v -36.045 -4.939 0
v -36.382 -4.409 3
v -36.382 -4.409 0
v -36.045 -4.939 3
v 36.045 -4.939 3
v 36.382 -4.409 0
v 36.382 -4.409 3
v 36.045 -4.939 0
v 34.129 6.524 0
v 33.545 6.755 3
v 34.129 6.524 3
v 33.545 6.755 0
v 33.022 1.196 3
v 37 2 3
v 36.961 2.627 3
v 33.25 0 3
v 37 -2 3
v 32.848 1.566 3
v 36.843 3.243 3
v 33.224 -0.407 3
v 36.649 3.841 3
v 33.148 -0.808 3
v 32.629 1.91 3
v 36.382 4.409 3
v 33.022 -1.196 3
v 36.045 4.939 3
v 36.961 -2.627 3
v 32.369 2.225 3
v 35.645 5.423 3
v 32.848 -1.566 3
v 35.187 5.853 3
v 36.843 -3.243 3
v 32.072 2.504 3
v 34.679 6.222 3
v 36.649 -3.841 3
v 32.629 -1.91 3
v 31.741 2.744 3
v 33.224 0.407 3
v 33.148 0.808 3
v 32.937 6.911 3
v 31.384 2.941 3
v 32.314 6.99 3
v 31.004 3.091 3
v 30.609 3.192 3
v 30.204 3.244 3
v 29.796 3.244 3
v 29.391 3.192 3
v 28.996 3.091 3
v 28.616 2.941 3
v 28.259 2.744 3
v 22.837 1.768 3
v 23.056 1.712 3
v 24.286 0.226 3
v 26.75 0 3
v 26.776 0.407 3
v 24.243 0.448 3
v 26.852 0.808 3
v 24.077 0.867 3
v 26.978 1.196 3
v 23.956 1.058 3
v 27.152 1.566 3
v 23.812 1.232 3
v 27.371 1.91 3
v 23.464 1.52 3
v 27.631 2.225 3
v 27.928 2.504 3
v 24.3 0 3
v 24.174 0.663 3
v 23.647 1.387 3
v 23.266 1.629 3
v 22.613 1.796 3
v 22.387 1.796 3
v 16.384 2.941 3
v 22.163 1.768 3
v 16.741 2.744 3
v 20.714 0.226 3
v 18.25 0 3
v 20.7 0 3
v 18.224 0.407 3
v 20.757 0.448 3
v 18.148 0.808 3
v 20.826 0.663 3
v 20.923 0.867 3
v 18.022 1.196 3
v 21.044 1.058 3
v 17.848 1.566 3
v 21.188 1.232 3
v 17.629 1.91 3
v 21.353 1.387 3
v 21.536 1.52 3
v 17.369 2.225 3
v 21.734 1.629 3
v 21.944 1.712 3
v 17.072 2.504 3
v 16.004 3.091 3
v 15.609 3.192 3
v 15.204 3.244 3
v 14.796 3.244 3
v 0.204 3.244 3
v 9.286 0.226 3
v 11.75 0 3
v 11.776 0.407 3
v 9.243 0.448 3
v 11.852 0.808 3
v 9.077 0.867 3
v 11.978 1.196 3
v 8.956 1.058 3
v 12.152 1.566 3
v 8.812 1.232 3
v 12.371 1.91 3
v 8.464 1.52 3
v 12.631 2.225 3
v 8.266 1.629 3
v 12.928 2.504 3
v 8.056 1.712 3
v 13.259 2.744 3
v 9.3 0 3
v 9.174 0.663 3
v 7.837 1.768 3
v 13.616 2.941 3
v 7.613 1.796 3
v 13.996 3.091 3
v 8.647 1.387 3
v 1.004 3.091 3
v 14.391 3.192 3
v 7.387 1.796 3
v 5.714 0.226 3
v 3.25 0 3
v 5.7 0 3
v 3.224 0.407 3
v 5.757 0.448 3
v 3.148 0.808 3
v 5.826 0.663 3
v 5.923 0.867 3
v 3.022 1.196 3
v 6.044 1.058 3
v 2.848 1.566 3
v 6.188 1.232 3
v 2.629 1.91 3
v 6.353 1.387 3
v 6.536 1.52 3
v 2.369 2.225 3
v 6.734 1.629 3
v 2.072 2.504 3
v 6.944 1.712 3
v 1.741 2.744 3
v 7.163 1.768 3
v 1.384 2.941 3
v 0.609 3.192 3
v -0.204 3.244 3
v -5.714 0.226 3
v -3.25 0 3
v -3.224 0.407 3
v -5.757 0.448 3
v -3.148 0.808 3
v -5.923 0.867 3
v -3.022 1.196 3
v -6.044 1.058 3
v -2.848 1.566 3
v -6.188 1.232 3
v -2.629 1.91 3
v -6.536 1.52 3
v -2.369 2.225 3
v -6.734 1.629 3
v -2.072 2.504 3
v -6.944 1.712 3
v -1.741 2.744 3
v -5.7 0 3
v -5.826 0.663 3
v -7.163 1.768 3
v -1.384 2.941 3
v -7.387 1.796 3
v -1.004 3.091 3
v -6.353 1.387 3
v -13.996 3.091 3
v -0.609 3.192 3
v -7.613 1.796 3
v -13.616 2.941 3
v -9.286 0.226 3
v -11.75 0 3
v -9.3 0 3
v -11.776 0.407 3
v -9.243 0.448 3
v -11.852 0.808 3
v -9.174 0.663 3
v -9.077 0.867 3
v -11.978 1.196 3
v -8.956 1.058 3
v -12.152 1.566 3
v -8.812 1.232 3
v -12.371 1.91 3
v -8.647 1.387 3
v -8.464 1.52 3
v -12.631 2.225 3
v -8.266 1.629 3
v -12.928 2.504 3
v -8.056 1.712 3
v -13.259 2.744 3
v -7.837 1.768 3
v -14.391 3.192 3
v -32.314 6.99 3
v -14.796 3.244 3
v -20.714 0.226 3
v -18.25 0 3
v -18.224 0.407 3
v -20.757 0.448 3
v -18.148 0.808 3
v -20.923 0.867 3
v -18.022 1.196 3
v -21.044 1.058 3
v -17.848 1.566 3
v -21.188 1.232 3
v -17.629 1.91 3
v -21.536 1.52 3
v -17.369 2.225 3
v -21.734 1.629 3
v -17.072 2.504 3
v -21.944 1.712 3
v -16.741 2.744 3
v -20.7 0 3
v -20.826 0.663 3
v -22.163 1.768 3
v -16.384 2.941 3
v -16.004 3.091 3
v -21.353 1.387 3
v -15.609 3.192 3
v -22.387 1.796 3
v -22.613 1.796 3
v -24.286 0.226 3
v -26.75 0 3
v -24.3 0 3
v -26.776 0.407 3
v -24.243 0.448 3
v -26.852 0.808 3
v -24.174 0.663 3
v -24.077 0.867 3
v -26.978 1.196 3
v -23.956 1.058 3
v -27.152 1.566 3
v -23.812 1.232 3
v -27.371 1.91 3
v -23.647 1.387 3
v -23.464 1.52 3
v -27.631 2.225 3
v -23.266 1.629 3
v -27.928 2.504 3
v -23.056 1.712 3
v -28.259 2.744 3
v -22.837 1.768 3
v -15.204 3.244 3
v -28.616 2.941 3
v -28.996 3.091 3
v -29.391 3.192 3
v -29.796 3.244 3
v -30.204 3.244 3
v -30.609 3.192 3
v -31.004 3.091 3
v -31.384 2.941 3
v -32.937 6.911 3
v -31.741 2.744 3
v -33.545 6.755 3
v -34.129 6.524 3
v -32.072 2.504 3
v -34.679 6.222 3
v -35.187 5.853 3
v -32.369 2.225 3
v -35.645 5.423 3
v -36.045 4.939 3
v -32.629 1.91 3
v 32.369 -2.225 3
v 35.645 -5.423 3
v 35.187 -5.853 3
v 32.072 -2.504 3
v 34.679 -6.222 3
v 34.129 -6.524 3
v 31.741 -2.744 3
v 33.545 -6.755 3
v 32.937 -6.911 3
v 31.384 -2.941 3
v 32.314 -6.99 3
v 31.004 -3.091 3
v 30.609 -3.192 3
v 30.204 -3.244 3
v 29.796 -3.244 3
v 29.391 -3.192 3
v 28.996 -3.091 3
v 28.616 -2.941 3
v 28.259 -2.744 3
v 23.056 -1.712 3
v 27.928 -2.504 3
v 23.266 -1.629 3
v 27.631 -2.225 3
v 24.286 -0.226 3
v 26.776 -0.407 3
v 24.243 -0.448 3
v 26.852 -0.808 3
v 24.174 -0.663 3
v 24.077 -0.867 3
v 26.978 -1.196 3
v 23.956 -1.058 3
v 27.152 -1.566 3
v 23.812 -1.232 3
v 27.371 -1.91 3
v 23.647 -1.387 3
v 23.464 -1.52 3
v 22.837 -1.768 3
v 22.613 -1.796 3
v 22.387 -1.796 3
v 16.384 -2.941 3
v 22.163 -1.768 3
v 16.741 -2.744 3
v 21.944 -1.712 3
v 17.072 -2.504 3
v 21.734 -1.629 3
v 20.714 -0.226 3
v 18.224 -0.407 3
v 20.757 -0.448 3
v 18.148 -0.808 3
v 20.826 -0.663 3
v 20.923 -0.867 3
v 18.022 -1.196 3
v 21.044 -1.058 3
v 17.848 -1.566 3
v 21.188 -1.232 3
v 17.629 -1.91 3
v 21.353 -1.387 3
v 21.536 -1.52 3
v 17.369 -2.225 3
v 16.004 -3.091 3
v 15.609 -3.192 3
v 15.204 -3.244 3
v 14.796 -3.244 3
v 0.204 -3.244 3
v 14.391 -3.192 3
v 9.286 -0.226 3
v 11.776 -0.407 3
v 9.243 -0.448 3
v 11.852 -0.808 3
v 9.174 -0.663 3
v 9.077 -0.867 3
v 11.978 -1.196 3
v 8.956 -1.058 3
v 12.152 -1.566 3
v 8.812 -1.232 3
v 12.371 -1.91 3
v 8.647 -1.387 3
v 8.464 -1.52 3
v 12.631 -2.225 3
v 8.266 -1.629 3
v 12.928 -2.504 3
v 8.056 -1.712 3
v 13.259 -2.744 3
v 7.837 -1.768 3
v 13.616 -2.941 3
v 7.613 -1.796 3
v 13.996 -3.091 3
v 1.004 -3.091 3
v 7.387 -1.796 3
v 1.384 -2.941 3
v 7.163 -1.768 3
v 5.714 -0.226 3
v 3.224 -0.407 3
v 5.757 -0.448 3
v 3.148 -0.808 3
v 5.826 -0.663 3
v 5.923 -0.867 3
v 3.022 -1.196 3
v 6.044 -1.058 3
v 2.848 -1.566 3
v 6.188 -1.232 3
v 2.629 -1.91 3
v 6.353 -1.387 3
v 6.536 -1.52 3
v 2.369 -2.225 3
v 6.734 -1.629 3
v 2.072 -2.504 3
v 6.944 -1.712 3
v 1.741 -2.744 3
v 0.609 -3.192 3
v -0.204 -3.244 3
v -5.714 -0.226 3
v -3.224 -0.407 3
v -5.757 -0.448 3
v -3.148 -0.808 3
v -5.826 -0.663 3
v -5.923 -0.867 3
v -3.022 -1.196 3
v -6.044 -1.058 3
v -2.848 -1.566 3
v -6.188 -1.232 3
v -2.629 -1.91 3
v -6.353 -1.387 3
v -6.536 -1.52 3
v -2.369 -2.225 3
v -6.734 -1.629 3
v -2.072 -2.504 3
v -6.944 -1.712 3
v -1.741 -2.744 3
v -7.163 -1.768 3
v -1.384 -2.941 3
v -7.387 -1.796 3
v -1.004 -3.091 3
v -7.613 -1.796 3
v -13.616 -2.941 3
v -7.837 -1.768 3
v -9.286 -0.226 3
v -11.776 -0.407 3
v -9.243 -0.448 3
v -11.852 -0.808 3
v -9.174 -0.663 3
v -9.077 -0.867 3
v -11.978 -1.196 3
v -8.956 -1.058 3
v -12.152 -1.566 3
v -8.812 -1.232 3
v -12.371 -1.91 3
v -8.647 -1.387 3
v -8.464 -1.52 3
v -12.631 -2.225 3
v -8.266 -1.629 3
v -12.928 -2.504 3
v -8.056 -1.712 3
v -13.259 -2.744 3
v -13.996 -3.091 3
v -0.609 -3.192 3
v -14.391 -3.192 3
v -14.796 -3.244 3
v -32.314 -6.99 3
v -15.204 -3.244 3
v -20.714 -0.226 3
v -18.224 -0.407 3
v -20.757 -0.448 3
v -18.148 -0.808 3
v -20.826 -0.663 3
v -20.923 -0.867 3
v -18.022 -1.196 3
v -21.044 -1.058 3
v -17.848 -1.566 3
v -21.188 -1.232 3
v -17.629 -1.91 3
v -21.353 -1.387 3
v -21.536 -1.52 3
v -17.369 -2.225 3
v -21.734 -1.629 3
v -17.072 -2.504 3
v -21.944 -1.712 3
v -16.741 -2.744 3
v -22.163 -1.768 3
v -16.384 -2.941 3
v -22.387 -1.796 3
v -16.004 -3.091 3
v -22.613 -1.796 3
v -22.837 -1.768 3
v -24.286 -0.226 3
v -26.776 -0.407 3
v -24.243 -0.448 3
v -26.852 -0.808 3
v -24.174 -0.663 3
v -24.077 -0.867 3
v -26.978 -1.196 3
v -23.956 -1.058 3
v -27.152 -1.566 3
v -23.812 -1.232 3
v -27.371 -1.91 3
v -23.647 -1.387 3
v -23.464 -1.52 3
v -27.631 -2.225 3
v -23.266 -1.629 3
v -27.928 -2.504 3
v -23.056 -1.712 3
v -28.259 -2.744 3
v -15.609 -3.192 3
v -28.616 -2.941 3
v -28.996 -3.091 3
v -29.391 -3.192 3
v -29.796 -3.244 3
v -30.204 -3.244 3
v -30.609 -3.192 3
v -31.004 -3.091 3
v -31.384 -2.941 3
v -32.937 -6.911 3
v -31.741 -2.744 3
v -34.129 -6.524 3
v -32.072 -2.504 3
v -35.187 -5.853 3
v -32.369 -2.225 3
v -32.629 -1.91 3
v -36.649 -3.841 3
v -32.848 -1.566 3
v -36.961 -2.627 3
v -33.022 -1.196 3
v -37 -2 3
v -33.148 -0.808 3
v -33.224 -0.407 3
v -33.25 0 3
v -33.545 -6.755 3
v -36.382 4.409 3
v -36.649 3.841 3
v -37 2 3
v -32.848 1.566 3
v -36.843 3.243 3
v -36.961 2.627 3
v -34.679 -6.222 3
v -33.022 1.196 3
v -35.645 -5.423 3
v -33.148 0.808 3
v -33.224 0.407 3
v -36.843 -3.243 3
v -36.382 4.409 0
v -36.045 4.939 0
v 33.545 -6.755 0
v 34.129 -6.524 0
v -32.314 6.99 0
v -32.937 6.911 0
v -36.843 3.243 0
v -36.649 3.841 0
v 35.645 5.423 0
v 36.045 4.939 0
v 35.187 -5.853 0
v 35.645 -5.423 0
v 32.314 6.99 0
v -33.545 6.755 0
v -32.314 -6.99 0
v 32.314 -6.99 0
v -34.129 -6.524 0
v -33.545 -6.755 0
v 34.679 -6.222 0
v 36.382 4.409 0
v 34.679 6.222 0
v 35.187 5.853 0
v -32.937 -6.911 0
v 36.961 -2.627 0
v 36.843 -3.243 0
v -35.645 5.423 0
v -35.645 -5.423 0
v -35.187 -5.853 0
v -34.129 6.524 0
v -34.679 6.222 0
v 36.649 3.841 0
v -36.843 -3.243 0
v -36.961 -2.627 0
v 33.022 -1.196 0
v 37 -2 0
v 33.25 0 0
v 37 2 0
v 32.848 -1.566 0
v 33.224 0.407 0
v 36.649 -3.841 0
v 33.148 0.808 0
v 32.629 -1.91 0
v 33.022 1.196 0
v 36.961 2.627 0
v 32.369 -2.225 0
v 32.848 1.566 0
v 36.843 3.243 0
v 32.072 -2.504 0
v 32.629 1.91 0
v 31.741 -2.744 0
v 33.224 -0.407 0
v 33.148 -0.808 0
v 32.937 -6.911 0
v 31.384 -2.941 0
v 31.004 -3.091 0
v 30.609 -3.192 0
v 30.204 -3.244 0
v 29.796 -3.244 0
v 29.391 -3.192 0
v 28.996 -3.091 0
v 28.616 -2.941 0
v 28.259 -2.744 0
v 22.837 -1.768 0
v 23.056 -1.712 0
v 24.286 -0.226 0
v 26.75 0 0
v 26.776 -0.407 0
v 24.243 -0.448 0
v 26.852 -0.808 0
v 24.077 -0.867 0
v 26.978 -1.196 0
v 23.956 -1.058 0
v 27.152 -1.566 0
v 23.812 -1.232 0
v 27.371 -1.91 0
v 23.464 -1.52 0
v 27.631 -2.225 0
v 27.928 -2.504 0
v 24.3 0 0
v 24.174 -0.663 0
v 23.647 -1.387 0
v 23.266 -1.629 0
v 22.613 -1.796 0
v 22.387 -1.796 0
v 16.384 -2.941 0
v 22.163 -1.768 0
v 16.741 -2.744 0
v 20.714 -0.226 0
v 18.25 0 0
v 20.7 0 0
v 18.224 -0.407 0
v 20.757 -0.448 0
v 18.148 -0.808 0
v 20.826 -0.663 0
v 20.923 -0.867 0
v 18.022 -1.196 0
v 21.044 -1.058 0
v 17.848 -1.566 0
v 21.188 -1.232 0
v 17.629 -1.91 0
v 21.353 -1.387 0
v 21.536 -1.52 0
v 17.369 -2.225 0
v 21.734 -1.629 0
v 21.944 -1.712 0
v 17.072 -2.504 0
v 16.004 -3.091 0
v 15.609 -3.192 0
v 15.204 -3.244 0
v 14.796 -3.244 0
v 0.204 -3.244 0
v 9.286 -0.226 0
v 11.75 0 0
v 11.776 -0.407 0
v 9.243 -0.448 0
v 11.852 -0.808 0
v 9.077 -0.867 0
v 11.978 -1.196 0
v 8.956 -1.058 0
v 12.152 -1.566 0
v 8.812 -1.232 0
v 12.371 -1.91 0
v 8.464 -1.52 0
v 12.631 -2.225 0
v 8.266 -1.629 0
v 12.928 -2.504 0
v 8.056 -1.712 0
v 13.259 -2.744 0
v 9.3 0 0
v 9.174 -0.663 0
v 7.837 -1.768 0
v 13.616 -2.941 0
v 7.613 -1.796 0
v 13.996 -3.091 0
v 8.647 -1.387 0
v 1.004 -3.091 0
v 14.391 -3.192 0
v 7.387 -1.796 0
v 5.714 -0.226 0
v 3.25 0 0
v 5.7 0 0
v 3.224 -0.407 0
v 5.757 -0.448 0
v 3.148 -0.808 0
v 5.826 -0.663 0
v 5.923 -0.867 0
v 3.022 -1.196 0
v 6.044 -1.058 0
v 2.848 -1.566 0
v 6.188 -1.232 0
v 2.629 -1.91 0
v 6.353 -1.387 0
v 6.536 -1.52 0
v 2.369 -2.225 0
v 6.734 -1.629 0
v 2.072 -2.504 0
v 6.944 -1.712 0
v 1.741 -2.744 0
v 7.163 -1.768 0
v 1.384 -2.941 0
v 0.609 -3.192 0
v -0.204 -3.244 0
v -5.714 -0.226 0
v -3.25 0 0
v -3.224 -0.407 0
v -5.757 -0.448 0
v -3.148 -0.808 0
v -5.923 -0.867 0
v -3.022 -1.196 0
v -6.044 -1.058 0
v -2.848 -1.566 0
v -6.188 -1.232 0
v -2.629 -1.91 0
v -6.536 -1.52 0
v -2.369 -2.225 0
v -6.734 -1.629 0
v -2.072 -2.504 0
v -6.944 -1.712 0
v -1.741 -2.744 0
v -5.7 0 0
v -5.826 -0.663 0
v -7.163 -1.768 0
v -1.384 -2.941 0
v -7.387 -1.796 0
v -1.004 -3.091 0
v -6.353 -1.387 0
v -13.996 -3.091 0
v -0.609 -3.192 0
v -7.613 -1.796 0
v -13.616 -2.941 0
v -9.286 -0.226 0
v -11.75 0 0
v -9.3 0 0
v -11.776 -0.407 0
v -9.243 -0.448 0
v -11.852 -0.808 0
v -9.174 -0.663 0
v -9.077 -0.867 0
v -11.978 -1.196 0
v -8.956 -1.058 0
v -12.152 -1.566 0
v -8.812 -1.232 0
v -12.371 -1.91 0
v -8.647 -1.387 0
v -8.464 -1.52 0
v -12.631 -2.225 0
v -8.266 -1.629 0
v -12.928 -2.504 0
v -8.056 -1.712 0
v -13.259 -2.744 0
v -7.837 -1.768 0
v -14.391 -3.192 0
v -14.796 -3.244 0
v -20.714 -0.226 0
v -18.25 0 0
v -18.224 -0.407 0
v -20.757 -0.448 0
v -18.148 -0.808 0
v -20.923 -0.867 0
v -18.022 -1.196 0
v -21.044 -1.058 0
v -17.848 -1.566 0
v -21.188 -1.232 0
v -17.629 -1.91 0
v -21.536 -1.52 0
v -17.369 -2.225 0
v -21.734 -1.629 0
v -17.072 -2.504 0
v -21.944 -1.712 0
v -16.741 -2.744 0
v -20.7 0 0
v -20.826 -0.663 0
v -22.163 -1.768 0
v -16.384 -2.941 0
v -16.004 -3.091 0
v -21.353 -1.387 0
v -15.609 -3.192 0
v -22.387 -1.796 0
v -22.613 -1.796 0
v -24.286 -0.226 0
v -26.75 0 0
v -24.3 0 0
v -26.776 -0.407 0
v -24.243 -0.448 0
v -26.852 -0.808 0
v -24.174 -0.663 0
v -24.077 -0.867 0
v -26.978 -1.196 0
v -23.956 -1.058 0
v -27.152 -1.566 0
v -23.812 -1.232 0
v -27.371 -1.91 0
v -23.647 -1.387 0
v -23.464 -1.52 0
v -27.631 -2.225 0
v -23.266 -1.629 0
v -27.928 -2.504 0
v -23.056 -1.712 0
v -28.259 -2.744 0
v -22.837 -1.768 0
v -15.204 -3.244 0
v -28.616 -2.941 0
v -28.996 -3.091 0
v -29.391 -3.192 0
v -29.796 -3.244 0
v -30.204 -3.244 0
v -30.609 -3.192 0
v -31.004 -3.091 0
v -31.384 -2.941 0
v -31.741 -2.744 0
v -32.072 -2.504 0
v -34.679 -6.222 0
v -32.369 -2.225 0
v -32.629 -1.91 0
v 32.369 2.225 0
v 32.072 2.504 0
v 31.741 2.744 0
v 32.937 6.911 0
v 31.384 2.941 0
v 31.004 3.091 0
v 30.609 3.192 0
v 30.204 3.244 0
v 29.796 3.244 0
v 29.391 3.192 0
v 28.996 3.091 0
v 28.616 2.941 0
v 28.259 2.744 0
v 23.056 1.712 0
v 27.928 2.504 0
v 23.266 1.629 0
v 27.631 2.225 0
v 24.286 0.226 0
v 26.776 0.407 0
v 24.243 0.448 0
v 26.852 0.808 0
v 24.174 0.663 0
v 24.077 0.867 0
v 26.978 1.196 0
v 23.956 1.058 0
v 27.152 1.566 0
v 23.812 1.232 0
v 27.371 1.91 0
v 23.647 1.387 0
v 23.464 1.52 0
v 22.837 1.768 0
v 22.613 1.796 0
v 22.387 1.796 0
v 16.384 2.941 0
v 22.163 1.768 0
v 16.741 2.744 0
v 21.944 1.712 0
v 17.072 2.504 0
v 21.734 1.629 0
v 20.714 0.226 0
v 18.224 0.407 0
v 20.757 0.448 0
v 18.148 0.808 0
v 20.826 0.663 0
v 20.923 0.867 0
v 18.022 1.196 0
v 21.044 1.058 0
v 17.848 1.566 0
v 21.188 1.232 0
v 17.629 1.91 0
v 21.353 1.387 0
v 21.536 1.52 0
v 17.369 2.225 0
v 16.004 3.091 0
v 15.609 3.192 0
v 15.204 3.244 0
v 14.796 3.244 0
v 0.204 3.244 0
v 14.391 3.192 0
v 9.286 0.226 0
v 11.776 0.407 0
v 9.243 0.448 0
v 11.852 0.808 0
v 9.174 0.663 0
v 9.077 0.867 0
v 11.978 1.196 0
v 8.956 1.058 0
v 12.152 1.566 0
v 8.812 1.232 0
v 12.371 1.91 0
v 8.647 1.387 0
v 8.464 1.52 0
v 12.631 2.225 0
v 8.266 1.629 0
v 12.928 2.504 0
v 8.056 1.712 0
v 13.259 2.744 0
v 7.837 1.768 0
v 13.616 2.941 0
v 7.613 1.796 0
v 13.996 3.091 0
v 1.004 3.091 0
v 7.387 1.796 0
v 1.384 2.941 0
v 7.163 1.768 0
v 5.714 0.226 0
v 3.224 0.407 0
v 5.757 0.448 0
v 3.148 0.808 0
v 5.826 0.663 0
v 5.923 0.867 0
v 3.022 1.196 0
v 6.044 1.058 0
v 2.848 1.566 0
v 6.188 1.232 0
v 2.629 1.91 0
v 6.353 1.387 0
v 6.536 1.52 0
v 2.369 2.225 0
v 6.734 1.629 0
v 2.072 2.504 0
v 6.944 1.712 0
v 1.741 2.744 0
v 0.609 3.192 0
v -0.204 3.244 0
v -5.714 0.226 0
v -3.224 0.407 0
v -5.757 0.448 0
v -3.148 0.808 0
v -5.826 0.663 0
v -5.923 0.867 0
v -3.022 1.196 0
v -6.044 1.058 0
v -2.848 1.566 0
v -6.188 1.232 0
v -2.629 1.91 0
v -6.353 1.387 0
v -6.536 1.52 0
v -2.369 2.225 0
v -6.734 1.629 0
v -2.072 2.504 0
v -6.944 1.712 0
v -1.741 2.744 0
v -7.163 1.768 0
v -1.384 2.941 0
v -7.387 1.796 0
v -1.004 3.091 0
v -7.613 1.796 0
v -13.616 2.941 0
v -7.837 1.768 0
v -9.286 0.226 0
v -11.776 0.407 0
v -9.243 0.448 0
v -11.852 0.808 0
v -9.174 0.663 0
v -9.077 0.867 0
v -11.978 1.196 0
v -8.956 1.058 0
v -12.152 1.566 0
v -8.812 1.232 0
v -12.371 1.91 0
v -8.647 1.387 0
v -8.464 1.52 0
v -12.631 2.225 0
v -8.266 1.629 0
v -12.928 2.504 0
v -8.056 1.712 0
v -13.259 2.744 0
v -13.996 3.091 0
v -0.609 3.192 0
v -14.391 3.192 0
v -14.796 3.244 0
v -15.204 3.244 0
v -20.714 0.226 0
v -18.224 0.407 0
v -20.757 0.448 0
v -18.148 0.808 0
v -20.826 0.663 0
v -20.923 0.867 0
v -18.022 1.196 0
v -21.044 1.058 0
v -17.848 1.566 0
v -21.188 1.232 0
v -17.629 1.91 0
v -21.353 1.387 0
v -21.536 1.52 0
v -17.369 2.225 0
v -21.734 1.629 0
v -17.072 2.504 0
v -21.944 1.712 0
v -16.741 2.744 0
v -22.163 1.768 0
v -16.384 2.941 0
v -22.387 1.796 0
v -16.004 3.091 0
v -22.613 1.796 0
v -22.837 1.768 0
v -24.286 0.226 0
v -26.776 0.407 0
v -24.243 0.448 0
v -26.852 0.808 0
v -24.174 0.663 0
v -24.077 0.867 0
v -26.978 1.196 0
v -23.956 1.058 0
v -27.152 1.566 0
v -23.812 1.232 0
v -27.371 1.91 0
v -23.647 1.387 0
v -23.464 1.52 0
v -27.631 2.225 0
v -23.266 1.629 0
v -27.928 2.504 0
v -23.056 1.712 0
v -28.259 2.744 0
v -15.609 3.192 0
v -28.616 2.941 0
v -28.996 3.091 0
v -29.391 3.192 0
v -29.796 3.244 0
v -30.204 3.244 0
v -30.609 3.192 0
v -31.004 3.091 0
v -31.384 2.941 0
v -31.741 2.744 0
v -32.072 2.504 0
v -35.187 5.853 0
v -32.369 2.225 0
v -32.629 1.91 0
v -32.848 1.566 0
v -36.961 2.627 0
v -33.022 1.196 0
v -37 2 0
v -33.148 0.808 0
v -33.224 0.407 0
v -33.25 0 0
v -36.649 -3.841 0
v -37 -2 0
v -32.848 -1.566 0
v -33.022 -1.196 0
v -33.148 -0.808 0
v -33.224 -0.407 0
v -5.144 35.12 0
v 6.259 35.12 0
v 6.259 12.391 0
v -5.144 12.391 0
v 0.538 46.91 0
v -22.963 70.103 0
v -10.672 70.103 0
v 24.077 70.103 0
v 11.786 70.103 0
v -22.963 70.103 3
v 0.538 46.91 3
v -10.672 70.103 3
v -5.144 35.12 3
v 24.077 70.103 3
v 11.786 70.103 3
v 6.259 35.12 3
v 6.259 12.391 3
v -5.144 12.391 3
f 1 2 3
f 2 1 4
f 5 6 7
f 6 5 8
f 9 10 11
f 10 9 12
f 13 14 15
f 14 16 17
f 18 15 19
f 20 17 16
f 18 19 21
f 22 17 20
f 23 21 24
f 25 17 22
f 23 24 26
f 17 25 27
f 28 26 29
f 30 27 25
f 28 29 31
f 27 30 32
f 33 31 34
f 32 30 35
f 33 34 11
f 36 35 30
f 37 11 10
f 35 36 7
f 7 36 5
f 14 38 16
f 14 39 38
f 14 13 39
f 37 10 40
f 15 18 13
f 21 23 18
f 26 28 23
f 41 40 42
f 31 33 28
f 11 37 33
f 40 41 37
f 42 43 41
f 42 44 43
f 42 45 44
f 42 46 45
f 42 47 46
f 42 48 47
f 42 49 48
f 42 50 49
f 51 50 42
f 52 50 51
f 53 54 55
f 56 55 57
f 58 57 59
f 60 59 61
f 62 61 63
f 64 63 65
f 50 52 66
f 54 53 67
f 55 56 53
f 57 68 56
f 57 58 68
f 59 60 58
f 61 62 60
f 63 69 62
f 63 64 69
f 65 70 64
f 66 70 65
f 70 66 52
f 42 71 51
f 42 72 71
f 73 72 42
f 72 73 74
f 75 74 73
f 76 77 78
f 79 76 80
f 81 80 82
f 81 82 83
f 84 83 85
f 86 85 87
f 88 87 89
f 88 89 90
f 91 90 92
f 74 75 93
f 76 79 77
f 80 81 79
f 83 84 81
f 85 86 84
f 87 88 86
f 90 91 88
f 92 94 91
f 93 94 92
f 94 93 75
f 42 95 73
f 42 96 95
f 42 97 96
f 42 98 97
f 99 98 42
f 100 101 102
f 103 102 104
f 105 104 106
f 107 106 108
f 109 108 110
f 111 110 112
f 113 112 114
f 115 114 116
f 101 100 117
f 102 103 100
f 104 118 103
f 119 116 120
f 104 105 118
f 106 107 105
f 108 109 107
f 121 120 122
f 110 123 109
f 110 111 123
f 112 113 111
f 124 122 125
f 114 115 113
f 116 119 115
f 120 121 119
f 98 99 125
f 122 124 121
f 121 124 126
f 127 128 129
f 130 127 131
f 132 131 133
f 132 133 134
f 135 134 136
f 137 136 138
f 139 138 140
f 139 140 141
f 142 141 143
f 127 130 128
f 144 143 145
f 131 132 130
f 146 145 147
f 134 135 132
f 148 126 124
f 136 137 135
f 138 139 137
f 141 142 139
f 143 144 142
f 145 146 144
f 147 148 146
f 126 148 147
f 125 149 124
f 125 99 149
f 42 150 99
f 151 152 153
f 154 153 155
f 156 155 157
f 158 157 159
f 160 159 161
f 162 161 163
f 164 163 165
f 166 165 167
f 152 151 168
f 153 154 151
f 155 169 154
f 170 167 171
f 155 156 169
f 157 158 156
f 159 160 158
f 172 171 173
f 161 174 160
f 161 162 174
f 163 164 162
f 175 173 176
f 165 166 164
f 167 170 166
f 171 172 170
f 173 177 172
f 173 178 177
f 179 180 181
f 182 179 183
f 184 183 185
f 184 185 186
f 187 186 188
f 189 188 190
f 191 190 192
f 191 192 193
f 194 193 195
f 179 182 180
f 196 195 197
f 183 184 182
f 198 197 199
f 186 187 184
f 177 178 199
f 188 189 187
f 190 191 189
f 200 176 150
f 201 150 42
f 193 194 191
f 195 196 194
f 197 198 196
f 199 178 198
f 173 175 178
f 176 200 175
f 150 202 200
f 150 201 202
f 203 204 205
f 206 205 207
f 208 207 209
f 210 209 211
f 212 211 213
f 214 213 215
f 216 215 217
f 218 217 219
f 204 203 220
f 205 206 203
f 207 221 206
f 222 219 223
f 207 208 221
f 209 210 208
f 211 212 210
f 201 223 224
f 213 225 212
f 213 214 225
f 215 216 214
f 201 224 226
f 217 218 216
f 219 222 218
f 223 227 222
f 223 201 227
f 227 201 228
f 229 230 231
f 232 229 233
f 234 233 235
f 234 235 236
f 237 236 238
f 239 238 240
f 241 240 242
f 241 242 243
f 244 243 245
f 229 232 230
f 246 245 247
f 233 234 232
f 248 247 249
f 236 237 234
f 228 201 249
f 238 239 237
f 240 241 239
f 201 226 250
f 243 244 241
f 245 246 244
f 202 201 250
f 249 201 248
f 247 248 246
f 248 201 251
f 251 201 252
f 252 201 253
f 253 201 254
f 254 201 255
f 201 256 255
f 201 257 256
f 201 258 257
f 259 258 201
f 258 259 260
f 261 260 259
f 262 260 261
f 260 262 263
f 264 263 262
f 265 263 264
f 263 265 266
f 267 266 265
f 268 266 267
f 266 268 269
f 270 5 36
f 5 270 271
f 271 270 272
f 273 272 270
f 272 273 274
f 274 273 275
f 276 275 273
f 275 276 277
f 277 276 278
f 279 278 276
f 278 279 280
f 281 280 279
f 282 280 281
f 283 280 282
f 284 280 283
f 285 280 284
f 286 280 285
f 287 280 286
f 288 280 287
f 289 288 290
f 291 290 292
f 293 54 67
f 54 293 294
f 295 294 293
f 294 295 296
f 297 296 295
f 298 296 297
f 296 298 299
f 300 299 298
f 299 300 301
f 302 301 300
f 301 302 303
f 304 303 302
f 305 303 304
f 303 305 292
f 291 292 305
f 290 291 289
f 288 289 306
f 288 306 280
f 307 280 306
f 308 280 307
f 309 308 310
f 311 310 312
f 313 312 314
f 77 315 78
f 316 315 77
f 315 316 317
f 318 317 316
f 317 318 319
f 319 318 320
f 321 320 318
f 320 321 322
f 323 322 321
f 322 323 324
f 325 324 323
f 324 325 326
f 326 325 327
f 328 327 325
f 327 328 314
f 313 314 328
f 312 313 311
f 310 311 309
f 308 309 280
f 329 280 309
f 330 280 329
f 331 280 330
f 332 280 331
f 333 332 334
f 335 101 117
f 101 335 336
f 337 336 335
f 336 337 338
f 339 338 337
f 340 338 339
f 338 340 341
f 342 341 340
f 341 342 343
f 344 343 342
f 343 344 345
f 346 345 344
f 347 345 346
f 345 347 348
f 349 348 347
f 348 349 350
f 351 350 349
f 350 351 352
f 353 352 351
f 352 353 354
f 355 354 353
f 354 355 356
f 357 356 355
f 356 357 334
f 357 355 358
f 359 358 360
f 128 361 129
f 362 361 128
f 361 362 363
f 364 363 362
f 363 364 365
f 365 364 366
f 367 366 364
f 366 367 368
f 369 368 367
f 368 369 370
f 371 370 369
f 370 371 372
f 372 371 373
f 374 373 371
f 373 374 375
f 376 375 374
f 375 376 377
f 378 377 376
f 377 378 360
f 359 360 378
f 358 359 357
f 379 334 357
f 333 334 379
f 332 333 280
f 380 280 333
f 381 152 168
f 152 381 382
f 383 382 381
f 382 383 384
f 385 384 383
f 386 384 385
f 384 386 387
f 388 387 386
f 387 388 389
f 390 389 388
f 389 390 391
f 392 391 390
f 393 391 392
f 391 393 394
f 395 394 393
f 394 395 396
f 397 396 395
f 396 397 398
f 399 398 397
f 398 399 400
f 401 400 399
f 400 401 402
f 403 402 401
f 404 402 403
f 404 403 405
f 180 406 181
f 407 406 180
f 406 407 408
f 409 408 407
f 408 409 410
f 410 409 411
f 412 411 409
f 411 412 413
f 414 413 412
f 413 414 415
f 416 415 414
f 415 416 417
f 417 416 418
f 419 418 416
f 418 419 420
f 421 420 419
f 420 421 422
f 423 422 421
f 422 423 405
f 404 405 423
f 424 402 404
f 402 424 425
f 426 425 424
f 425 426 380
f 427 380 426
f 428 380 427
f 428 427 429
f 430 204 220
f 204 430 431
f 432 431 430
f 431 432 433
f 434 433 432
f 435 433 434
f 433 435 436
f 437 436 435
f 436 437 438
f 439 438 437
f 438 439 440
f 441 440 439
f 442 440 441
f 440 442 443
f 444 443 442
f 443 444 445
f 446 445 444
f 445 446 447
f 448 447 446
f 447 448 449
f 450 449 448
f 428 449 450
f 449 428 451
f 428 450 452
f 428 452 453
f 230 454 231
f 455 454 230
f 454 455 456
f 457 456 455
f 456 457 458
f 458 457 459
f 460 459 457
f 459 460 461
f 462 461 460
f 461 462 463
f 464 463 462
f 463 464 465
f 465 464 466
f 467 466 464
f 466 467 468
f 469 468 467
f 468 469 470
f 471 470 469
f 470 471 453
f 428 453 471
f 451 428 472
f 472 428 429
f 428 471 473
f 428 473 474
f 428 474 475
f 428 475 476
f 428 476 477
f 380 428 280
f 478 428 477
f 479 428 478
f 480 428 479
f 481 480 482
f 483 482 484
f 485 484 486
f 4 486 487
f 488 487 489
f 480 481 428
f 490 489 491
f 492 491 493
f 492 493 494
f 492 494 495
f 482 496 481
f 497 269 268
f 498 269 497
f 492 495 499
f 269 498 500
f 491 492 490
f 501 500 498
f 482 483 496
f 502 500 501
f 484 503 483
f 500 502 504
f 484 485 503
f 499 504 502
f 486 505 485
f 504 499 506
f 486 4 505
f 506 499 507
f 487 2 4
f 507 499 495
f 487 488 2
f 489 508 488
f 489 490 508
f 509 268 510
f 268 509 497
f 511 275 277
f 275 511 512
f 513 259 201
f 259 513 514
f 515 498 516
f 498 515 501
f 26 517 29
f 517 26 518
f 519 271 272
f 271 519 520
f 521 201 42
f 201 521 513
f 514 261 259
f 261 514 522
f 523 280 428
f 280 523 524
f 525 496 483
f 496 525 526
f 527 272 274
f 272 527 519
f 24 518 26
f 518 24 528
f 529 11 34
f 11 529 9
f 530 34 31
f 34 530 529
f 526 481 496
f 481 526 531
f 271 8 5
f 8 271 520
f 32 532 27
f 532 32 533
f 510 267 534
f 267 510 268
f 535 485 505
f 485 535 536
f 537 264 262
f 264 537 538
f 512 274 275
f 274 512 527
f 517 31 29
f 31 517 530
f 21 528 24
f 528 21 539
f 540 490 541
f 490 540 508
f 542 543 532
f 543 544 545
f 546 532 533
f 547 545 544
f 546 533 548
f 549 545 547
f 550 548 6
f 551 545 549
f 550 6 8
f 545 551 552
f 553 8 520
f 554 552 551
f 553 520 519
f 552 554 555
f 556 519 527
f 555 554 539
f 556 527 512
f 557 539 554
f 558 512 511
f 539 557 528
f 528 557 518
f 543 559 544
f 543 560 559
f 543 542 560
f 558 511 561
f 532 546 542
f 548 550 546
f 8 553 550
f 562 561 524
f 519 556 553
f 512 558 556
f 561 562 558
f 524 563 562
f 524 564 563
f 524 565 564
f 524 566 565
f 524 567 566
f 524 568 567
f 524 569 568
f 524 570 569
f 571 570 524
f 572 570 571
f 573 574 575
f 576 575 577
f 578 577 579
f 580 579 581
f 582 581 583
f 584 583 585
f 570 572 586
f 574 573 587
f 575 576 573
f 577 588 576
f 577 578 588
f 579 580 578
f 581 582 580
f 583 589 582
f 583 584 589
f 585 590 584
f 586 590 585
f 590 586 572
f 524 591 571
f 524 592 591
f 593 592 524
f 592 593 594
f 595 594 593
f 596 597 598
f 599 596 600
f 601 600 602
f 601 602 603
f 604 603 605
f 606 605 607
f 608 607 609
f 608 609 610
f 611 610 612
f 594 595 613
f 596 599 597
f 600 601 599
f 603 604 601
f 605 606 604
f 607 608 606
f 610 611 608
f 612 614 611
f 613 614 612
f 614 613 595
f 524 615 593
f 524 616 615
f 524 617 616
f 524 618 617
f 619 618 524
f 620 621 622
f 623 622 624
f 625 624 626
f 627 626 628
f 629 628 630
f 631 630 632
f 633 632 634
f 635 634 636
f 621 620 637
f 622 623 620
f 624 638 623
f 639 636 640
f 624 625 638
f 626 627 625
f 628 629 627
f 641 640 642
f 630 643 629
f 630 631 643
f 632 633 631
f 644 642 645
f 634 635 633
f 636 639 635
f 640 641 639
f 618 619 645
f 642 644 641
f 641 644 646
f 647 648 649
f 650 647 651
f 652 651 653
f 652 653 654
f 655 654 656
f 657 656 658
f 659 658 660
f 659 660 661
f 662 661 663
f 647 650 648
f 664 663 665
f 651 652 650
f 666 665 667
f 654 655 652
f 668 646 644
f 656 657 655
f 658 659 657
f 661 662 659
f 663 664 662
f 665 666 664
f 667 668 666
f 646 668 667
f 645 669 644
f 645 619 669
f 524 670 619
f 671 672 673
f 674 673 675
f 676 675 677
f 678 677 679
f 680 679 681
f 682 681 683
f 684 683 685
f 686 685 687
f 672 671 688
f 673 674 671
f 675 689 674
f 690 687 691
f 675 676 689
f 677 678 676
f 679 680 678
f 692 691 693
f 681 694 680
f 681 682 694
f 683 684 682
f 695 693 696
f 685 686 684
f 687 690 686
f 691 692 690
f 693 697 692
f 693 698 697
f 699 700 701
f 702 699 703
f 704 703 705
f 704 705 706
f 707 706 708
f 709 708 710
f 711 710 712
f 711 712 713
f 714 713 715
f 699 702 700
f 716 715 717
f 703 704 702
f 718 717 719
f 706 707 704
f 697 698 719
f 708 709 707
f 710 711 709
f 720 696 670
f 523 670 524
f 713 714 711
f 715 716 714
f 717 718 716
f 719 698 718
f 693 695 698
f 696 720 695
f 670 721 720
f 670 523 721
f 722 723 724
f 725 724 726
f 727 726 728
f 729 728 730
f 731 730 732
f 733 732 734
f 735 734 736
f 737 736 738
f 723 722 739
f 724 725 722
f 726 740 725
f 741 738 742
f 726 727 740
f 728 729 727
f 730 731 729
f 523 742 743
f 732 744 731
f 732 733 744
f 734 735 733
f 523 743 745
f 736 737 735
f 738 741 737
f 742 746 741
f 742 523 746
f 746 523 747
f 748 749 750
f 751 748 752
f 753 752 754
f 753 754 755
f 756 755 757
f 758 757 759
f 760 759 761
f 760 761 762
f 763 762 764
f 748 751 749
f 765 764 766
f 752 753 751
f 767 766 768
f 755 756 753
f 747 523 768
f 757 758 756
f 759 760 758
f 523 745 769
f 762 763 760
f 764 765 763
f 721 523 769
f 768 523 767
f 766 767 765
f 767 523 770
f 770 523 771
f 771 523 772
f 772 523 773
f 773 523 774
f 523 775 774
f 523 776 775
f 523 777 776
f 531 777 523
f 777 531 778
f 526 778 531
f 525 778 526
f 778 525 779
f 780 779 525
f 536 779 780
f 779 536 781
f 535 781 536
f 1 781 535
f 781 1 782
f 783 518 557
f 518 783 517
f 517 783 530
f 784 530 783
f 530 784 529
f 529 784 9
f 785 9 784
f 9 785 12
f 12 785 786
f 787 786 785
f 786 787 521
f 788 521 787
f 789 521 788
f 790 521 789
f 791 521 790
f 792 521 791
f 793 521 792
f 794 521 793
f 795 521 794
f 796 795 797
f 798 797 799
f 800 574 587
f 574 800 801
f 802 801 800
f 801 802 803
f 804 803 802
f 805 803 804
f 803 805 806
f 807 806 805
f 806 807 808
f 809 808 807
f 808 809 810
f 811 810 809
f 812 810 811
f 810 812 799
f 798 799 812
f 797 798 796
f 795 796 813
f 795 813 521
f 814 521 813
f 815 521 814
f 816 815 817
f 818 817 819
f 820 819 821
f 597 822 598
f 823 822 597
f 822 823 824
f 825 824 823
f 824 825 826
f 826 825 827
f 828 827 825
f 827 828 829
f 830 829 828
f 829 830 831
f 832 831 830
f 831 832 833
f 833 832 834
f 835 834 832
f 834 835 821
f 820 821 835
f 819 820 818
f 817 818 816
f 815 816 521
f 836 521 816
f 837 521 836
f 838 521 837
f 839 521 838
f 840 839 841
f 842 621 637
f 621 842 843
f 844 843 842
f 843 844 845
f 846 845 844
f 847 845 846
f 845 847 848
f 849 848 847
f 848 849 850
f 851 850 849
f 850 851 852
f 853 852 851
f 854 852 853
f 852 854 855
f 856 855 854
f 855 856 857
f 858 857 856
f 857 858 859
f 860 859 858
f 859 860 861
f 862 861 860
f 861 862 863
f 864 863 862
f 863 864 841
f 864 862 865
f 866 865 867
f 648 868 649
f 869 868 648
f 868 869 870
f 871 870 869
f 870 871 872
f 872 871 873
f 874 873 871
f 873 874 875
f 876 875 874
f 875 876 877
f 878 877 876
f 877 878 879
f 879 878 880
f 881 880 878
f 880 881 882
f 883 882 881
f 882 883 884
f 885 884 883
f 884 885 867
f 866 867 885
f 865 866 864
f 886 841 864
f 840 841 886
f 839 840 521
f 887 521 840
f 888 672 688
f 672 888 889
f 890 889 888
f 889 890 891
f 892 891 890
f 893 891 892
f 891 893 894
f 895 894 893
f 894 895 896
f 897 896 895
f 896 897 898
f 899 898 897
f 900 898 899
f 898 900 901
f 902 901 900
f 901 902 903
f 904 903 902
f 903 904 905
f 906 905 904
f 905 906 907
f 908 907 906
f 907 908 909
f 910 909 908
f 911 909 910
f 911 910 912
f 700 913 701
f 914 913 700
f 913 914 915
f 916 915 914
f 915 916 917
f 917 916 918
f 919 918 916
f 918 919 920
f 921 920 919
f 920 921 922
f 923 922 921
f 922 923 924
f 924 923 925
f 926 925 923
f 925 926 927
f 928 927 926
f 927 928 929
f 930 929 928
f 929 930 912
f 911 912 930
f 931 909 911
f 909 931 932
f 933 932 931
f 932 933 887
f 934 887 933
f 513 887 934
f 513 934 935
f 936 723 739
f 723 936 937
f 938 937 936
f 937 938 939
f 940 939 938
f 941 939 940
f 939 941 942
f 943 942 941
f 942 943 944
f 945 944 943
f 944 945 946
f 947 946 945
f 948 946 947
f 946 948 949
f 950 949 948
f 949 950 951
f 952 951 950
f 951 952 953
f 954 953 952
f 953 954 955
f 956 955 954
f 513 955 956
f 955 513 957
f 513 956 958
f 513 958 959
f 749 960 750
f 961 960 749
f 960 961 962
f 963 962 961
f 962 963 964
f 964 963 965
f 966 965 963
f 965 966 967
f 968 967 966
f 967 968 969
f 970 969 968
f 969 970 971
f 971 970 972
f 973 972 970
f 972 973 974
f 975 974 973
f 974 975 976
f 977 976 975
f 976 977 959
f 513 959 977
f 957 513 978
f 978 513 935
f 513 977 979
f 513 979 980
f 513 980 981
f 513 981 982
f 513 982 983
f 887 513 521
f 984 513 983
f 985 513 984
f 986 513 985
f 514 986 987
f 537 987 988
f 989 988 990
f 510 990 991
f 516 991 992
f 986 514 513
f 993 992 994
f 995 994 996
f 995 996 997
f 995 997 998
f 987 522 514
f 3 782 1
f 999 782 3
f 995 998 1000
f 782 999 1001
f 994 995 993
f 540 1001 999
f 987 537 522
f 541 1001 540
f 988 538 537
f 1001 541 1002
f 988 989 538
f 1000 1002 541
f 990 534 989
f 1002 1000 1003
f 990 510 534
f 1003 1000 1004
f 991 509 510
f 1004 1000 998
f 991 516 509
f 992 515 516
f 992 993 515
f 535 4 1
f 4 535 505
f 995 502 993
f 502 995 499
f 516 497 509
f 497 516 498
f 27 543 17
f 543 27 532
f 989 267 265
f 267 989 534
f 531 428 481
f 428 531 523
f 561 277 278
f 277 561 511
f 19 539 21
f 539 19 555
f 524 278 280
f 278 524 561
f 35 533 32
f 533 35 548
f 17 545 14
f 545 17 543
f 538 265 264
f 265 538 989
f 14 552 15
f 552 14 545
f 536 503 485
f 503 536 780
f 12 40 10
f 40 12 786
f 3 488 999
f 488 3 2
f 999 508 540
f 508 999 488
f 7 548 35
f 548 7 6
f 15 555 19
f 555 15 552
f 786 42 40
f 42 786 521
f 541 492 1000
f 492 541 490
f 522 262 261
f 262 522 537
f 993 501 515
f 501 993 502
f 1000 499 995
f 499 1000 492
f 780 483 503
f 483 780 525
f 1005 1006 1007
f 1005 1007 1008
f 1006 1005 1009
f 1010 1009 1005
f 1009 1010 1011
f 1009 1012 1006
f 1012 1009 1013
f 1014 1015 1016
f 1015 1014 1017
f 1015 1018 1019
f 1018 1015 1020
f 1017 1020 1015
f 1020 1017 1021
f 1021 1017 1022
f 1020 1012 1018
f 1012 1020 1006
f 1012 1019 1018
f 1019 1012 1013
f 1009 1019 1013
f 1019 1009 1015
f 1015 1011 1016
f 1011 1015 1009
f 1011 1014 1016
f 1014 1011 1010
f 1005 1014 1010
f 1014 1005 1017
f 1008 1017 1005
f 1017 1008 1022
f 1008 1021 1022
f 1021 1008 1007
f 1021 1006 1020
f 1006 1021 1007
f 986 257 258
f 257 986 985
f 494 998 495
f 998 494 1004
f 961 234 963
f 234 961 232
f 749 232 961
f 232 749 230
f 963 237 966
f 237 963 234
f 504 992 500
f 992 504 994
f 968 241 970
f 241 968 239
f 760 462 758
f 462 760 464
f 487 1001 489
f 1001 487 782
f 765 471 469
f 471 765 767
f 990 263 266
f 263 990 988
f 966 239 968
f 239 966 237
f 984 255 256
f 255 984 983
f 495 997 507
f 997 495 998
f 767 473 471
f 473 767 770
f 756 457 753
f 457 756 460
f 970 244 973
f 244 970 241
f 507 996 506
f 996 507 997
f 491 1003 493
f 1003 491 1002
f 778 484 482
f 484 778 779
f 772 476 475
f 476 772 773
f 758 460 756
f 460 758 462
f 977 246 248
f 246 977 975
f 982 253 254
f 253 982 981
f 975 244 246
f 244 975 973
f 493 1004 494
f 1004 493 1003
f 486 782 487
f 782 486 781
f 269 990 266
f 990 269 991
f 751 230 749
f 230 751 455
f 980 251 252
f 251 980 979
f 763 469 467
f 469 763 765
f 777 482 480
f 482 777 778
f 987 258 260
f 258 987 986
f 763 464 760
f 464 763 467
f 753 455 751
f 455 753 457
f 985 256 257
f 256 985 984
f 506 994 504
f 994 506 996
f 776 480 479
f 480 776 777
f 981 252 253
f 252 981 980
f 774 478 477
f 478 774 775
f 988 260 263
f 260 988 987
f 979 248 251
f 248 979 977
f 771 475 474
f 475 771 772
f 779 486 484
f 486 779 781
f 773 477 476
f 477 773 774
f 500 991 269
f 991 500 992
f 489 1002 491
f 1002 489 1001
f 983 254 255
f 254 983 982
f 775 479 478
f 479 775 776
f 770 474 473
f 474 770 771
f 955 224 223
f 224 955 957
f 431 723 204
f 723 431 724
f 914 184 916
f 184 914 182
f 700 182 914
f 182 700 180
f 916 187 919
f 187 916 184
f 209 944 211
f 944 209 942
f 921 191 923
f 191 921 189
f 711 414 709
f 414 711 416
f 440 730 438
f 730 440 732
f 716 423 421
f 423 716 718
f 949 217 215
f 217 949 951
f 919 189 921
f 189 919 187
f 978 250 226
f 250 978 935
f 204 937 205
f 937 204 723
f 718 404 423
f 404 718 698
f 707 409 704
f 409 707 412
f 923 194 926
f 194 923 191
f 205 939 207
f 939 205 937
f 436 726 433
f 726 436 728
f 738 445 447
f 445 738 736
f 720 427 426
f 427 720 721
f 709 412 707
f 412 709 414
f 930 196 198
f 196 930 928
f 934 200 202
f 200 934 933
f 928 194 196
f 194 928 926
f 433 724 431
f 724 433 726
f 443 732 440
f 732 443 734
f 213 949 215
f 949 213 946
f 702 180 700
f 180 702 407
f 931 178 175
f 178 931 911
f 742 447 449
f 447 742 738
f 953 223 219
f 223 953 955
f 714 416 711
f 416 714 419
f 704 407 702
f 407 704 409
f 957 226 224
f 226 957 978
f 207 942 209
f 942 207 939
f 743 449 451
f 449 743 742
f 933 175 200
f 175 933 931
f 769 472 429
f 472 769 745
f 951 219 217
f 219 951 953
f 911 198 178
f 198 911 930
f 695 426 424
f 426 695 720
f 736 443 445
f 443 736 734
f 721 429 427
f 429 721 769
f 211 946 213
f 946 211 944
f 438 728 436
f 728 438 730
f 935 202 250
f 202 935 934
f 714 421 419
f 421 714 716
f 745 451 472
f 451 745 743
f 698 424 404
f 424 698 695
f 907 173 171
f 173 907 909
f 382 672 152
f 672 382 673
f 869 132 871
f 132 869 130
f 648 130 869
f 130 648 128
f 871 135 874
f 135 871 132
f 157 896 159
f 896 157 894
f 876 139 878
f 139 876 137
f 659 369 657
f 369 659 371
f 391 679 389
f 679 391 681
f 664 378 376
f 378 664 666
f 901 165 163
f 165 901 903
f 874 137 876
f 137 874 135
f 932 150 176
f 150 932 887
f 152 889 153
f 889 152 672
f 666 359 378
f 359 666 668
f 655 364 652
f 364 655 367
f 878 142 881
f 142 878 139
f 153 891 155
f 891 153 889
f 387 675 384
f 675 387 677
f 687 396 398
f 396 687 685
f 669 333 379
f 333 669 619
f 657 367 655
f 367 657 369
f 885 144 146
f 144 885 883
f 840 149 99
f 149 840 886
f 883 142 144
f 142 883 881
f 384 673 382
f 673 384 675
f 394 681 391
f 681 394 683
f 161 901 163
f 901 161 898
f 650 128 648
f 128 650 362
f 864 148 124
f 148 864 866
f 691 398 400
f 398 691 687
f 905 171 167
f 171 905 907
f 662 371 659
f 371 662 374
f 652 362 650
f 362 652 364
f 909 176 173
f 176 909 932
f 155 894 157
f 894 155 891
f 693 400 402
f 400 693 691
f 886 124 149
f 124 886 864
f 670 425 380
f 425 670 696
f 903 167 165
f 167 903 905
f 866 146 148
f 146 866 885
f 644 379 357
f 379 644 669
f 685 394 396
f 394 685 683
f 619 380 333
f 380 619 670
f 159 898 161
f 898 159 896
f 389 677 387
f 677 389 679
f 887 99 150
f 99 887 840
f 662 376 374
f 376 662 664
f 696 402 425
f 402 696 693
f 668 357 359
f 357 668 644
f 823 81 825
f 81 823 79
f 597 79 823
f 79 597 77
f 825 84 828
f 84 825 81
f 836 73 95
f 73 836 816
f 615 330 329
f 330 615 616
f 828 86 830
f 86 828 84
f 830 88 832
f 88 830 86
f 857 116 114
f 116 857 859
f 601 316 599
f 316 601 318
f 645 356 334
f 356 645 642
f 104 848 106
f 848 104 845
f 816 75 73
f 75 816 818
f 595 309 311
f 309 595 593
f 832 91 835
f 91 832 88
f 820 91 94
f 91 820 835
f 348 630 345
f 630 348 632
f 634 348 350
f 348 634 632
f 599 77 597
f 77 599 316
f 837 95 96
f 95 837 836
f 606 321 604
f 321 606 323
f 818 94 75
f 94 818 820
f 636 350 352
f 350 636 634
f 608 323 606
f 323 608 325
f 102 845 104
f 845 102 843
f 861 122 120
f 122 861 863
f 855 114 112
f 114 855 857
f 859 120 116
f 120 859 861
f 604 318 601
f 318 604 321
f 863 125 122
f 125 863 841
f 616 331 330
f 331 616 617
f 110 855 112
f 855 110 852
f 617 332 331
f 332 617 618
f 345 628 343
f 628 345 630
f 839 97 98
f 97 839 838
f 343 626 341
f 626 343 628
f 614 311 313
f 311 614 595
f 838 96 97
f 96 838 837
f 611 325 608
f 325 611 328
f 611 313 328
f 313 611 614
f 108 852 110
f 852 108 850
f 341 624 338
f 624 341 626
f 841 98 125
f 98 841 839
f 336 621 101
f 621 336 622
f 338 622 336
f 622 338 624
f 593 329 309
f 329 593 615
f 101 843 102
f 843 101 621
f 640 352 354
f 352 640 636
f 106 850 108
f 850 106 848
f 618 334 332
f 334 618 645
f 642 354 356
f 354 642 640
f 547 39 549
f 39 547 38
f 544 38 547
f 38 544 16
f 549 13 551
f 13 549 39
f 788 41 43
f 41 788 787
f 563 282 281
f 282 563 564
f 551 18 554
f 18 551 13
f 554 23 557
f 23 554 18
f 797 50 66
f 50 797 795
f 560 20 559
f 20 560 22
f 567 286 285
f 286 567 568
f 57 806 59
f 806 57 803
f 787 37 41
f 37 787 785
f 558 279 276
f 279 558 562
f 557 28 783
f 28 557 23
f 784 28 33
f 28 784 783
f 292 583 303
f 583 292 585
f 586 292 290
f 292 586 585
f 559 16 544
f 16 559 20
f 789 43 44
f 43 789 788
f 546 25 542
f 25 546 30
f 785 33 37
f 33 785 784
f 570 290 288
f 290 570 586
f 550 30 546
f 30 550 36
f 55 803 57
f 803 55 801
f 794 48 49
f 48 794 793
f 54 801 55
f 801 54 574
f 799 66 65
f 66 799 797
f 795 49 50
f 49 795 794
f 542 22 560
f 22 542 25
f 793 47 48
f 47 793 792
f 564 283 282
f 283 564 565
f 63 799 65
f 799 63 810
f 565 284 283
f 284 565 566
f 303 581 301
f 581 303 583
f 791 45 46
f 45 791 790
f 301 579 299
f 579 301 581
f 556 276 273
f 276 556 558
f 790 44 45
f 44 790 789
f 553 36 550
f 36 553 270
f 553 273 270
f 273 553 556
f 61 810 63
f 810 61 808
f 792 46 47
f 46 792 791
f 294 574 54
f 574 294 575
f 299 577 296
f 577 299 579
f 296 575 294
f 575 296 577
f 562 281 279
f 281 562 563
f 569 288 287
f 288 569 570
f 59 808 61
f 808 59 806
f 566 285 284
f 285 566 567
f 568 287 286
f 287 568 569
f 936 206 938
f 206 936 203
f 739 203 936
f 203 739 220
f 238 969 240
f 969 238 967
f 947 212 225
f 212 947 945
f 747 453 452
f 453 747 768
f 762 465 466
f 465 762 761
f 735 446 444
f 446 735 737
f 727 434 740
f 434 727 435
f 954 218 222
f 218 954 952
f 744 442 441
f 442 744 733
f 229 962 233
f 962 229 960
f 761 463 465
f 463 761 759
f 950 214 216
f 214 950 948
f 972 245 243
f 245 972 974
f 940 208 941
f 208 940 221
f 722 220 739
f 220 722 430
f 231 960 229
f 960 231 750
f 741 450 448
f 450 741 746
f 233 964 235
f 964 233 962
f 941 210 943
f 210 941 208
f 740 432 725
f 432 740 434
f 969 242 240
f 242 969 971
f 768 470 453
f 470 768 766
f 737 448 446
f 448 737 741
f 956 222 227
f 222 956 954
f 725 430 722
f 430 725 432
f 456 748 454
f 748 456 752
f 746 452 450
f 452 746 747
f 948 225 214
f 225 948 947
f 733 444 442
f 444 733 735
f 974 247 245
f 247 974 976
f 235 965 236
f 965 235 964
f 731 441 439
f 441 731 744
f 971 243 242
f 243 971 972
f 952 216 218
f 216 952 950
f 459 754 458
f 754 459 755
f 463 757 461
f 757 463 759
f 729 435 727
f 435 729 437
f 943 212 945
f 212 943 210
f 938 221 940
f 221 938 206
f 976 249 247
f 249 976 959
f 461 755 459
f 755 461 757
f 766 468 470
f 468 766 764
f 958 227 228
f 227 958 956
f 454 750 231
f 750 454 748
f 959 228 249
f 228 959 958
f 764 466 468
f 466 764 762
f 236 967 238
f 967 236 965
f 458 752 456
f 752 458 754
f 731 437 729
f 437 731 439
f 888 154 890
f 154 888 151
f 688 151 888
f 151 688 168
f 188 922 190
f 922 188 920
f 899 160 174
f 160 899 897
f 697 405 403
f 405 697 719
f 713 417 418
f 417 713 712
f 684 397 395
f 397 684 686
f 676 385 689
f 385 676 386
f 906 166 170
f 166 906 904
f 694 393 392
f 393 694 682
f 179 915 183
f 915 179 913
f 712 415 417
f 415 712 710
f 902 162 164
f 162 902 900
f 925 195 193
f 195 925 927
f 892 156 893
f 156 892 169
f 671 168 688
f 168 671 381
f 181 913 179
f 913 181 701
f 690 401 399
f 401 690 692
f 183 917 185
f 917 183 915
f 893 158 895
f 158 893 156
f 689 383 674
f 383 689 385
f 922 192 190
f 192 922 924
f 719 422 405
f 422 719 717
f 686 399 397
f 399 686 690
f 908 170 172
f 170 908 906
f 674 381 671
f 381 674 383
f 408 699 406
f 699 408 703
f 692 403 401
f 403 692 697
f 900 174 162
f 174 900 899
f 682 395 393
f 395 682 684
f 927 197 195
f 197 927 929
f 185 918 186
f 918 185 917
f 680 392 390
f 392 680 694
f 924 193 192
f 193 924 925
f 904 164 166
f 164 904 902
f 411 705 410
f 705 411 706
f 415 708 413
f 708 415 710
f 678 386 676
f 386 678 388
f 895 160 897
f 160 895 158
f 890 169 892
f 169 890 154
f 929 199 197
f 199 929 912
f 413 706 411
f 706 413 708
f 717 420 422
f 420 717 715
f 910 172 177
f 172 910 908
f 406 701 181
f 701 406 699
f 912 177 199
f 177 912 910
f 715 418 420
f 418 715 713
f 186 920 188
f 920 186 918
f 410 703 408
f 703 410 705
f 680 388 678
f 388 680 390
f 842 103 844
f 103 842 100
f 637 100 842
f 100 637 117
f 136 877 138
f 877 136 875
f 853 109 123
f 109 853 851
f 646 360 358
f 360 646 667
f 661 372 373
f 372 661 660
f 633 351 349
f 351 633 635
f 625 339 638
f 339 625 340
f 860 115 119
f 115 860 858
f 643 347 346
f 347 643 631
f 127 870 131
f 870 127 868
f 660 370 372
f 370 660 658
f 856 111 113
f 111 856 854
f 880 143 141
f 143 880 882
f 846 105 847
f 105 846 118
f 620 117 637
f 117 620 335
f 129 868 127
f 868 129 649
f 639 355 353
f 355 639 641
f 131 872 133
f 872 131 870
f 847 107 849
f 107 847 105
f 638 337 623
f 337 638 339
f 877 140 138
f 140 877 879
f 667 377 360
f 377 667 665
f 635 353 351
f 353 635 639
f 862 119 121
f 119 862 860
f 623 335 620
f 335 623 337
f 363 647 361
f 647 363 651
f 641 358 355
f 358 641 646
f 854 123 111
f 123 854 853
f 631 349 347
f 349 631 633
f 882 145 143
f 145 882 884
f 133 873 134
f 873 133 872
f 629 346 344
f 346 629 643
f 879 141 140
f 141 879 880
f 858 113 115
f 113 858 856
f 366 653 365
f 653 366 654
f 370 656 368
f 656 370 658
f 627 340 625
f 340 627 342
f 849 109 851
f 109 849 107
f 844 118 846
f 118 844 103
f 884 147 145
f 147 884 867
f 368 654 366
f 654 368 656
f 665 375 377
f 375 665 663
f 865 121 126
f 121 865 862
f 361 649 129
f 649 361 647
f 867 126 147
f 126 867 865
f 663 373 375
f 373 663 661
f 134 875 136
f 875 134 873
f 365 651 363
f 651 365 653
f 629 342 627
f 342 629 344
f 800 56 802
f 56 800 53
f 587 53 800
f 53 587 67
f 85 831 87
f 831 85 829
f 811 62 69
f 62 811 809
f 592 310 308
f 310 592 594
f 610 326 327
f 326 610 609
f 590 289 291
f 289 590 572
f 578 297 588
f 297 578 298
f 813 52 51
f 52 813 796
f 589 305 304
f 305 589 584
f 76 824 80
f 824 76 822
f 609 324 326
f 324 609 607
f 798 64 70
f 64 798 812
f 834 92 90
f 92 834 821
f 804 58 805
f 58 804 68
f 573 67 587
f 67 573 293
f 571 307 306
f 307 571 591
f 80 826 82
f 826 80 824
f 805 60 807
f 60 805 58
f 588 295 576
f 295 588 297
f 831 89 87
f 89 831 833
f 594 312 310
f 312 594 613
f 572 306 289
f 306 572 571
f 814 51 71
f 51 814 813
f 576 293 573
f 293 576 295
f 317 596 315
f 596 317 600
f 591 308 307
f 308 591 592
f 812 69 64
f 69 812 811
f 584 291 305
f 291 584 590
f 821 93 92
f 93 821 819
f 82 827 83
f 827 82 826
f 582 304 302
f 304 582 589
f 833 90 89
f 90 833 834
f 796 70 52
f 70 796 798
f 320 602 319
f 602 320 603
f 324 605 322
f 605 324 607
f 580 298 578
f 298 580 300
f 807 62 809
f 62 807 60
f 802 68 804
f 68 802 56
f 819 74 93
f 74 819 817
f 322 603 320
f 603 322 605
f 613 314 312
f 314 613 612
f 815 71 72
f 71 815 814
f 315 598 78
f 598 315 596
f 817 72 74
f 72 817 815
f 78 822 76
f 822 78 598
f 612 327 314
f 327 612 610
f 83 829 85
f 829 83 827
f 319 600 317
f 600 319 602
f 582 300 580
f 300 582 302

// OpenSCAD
$fn = 50;


difference() {
	union() {
		hull() {
			translate(v = [-32.0000000000, 2.0000000000, 0]) {
				cylinder(h = 3, r = 5);
			}
			translate(v = [32.0000000000, 2.0000000000, 0]) {
				cylinder(h = 3, r = 5);
			}
			translate(v = [-32.0000000000, -2.0000000000, 0]) {
				cylinder(h = 3, r = 5);
			}
			translate(v = [32.0000000000, -2.0000000000, 0]) {
				cylinder(h = 3, r = 5);
			}
		}
		translate(v = [0, 68.7500000000, 0]) {
			linear_extrude(height = 3) {
				text(font = "DejaVu Sans Mono:style=Bold", halign = "center", size = 57.0000000000, text = "Y", valign = "top");
			}
		}
	}
	union() {
		translate(v = [-30.0000000000, 0.0000000000, 0]) {
			translate(v = [0, 0, -100]) {
				cylinder(h = 200, r = 3.2500000000);
			}
		}
		translate(v = [-15.0000000000, 0.0000000000, 0]) {
			translate(v = [0, 0, -100]) {
				cylinder(h = 200, r = 3.2500000000);
			}
		}
		translate(v = [0, 0, -100]) {
			cylinder(h = 200, r = 3.2500000000);
		}
		translate(v = [15.0000000000, 0.0000000000, 0]) {
			translate(v = [0, 0, -100]) {
				cylinder(h = 200, r = 3.2500000000);
			}
		}
		translate(v = [30.0000000000, 0.0000000000, 0]) {
			translate(v = [0, 0, -100]) {
				cylinder(h = 200, r = 3.2500000000);
			}
		}
		translate(v = [-30.0000000000, 0.0000000000, 0]) {
			translate(v = [0, 0, -100]) {
				cylinder(h = 200, r = 1.8000000000);
			}
		}
		translate(v = [-22.5000000000, 0.0000000000, 0]) {
			translate(v = [0, 0, -100]) {
				cylinder(h = 200, r = 1.8000000000);
			}
		}
		translate(v = [-15.0000000000, 0.0000000000, 0]) {
			translate(v = [0, 0, -100]) {
				cylinder(h = 200, r = 1.8000000000);
			}
		}
		translate(v = [-7.5000000000, 0.0000000000, 0]) {
			translate(v = [0, 0, -100]) {
				cylinder(h = 200, r = 1.8000000000);
			}
		}
		translate(v = [0, 0, -100]) {
			cylinder(h = 200, r = 1.8000000000);
		}
		translate(v = [7.5000000000, 0.0000000000, 0]) {
			translate(v = [0, 0, -100]) {
				cylinder(h = 200, r = 1.8000000000);
			}
		}
		translate(v = [15.0000000000, 0.0000000000, 0]) {
			translate(v = [0, 0, -100]) {
				cylinder(h = 200, r = 1.8000000000);
			}
		}
		translate(v = [22.5000000000, 0.0000000000, 0]) {
			translate(v = [0, 0, -100]) {
				cylinder(h = 200, r = 1.8000000000);
			}
		}
		translate(v = [30.0000000000, 0.0000000000, 0]) {
			translate(v = [0, 0, -100]) {
				cylinder(h = 200, r = 1.8000000000);
			}
		}
	}
}
